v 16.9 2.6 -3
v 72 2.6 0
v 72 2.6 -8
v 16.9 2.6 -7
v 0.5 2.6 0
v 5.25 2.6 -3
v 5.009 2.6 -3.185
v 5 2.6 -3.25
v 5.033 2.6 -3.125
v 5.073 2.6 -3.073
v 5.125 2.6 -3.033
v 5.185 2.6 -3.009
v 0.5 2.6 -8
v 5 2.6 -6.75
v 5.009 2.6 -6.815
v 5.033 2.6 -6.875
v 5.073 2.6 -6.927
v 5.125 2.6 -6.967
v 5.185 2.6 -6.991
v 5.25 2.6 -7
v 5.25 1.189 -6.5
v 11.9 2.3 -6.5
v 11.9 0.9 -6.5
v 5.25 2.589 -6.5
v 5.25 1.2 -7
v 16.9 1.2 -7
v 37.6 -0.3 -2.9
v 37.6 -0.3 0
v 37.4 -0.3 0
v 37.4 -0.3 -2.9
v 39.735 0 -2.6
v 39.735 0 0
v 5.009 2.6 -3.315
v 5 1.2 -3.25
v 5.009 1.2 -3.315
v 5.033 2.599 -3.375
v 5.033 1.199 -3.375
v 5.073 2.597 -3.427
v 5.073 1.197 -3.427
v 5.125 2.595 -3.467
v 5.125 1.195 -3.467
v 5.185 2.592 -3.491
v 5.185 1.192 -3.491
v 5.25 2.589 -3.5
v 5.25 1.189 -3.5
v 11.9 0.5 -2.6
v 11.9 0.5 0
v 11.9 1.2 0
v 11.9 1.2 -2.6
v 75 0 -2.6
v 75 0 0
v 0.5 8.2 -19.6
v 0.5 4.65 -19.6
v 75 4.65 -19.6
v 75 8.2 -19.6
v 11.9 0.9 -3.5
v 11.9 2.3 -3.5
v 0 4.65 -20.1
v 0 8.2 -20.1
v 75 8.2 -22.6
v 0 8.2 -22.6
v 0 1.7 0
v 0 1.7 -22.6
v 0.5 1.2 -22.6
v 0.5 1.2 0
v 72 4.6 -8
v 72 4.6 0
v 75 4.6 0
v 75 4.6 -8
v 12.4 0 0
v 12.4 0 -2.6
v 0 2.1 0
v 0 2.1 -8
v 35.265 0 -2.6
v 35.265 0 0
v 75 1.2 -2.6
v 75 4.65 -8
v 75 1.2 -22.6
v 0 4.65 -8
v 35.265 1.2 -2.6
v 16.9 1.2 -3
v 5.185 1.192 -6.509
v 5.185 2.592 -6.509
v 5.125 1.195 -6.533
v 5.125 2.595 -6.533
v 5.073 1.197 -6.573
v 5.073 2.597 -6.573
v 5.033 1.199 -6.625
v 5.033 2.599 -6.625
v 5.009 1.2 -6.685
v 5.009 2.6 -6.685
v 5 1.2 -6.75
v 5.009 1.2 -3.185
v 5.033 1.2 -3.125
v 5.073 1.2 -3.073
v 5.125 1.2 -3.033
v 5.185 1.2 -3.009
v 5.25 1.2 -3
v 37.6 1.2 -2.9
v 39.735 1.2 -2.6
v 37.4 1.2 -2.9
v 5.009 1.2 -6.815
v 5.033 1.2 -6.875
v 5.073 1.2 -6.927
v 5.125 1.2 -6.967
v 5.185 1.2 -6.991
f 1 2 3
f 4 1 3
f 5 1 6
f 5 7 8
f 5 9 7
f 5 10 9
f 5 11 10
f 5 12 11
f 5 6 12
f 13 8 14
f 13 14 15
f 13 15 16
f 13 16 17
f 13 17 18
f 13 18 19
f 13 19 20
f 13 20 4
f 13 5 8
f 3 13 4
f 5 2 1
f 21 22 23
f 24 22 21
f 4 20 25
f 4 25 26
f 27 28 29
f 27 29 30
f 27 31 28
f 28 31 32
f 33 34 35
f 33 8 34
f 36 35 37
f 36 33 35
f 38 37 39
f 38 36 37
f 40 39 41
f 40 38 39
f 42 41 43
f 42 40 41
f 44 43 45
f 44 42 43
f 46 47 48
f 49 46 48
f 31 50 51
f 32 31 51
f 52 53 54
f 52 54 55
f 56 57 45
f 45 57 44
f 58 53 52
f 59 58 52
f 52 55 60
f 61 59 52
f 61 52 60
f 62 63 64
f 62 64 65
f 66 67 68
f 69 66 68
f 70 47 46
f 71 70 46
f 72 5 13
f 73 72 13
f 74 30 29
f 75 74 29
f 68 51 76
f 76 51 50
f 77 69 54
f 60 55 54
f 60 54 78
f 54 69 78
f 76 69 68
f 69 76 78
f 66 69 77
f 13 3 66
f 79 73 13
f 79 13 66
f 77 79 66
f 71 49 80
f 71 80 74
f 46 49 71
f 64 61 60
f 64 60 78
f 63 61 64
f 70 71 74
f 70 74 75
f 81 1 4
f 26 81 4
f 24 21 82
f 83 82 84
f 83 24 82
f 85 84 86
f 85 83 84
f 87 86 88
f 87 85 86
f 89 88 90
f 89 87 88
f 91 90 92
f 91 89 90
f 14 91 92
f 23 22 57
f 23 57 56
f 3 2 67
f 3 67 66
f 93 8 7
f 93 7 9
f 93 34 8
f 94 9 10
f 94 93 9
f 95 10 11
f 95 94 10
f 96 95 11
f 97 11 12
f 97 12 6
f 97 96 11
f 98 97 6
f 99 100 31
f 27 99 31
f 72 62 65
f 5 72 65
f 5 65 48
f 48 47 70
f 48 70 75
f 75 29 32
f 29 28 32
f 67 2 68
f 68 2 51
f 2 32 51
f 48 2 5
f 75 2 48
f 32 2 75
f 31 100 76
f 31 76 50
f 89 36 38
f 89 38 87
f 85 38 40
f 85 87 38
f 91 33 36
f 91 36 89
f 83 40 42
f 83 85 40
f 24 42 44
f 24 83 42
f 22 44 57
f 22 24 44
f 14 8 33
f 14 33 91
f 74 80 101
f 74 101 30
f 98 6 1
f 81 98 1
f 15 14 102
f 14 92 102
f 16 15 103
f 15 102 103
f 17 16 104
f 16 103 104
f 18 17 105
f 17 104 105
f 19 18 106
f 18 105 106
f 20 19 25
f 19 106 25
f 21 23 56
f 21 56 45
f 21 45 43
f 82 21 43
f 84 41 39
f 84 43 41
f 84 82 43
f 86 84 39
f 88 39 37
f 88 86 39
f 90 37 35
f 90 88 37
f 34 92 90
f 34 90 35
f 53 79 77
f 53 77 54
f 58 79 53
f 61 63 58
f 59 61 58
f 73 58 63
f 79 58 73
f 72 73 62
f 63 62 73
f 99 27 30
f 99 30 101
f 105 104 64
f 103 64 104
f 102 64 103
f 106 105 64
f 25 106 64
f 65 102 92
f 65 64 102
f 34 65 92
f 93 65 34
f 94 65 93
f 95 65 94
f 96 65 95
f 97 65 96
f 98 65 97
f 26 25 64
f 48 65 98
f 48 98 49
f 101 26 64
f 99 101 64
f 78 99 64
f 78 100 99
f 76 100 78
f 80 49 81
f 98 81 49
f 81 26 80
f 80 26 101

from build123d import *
from OCP.BRepFilletAPI import BRepFilletAPI_MakeChamfer

# Parameters (mm, degrees)
BOSS_EXTRU_1_DEPTH      = 75
ESQUISSE2_W             = 11.9
ESQUISSE2_H             = 4
ENL_V_MAT_EXTRU_1_DEPTH = 10
BOSS_EXTRU_2_START      = 0.5
BOSS_EXTRU_2_DEPTH      = 3
ESQUISSE4_W             = 3
ESQUISSE4_H             = 8
BOSS_EXTRU_3_DEPTH      = 2
ESQUISSE5_W             = 11.9
ESQUISSE5_H             = 1.2
ENL_V_MAT_EXTRU_2_DEPTH = 3
CHANFREIN1_SIZE         = 0.5
CONG_1_R                = 0.25
BOSS_EXTRU_4_DEPTH      = 0.1
CHANFREIN2_SIZE         = 0.3
CHANFREIN2_SIZE_2       = 2.134610917
CHANFREIN3_SIZE         = 0.3
CHANFREIN3_SIZE_2       = 2.134610917


with BuildPart() as part:
    # Esquisse1 → Boss.-Extru.1 (new body)
    with BuildSketch(Plane(origin=(0, 0, 0), x_dir=(0, 0, -1), z_dir=(1, 0, 0))):
        Polygon((0, 0), (0, 2.6), (8, 2.6), (8, 4.65), (19.6, 4.65), (19.6, 8.2), (22.6, 8.2), (22.6, 1.2), (2.6, 1.2), (2.6, 0), align=None)
    extrude(amount=BOSS_EXTRU_1_DEPTH)

    # Esquisse2 → Enlèv. mat.-Extru.1 (cut)
    with BuildSketch(Plane(origin=(0, 2.6, 0), x_dir=(1, 0, 0), z_dir=(0, 1, 0))):
        with Locations((10.95, 5)):
            Rectangle(ESQUISSE2_W, ESQUISSE2_H)
    extrude(amount=-ENL_V_MAT_EXTRU_1_DEPTH, mode=Mode.SUBTRACT)

    # Esquisse3 → Boss.-Extru.2 (add)
    with BuildSketch(Plane.XY.offset(-7).offset(BOSS_EXTRU_2_START)):
        Polygon((5, 2.6), (11.9, 2.3), (11.9, 0.9), (5, 1.2), align=None)
    extrude(amount=BOSS_EXTRU_2_DEPTH)

    # Esquisse4 → Boss.-Extru.3 (add)
    with BuildSketch(Plane(origin=(0, 2.6, 0), x_dir=(1, 0, 0), z_dir=(0, 1, 0))):
        with Locations((73.5, 4)):
            Rectangle(ESQUISSE4_W, ESQUISSE4_H)
    extrude(amount=BOSS_EXTRU_3_DEPTH)

    # Esquisse5 → Enlèv. mat.-Extru.2 (cut)
    with BuildSketch(Plane.XY):
        with Locations((5.95, 0.6)):
            Rectangle(ESQUISSE5_W, ESQUISSE5_H)
    extrude(amount=-ENL_V_MAT_EXTRU_2_DEPTH, mode=Mode.SUBTRACT)

    # Chanfrein1
    chanfrein1_edges = [part.edges().sort_by_distance(p)[0] for p in [
        (0, 2.6, -4),
        (0, 6.425, -19.6),
        (0, 1.2, -11.3),
        (11.9, 0, -1.3),
    ]]
    chamfer(chanfrein1_edges, length=CHANFREIN1_SIZE)

    # Congé1
    cong_1_edges = [part.edges().sort_by_distance(p)[0] for p in [
        (5, 1.9, -7),
        (5, 1.9, -3),
        (5, 1.9, -6.5),
        (5, 1.9, -3.5),
    ]]
    fillet(cong_1_edges, radius=CONG_1_R - 0.0001)  # a hair under: the kernel refuses the full size

    # Esquisse6 → Boss.-Extru.4 (add, symmetric)
    with BuildSketch(Plane(origin=(37.5, 0, 0), x_dir=(0, 0, -1), z_dir=(1, 0, 0))):
        Polygon((0, 0), (0, -0.3), (2.9, -0.3), (2.9, 1.2), (2.6, 1.2), (2.6, 0), align=None)
    extrude(amount=BOSS_EXTRU_4_DEPTH, both=True)

    # Chanfrein2
    chanfrein2_edges_1 = [part.edges().sort_by_distance(p)[0] for p in [
        (37.4, 0.6, -2.6),
    ]]
    chanfrein2_side_1 = [part.faces().sort_by_distance(p)[0] for p in [
        (37.4, 0.6, -2.606),
    ]]
    chanfrein2_edges_2 = [part.edges().sort_by_distance(p)[0] for p in [
        (37.4, 0, -1.3),
    ]]
    chanfrein2_side_2 = [part.faces().sort_by_distance(p)[0] for p in [
        (37.394, 0, -1.3),
    ]]
    chanfrein2 = BRepFilletAPI_MakeChamfer(part.part.solid().wrapped)
    for e in chanfrein2_edges_1:
        chanfrein2.Add(CHANFREIN2_SIZE - 0.0001, CHANFREIN2_SIZE_2 - 0.0001, e.wrapped, chanfrein2_side_1[0].wrapped)
    for e in chanfrein2_edges_2:
        chanfrein2.Add(CHANFREIN2_SIZE_2 - 0.0001, CHANFREIN2_SIZE - 0.0001, e.wrapped, chanfrein2_side_2[0].wrapped)
    add(Compound.cast(chanfrein2.Shape()), mode=Mode.REPLACE)  # a hair under: the kernel refuses the full size

    # Chanfrein3
    chanfrein3_edges_1 = [part.edges().sort_by_distance(p)[0] for p in [
        (37.6, 0.6, -2.6),
    ]]
    chanfrein3_side_1 = [part.faces().sort_by_distance(p)[0] for p in [
        (37.6, 0.6, -2.606),
    ]]
    chanfrein3_edges_2 = [part.edges().sort_by_distance(p)[0] for p in [
        (37.6, 0, -1.3),
    ]]
    chanfrein3_side_2 = [part.faces().sort_by_distance(p)[0] for p in [
        (37.6, -0.006, -1.3),
    ]]
    chanfrein3 = BRepFilletAPI_MakeChamfer(part.part.solid().wrapped)
    for e in chanfrein3_edges_1:
        chanfrein3.Add(CHANFREIN3_SIZE - 0.0001, CHANFREIN3_SIZE_2 - 0.0001, e.wrapped, chanfrein3_side_1[0].wrapped)
    for e in chanfrein3_edges_2:
        chanfrein3.Add(CHANFREIN3_SIZE - 0.0001, CHANFREIN3_SIZE_2 - 0.0001, e.wrapped, chanfrein3_side_2[0].wrapped)
    add(Compound.cast(chanfrein3.Shape()), mode=Mode.REPLACE)  # a hair under: the kernel refuses the full size


solid = part.part
